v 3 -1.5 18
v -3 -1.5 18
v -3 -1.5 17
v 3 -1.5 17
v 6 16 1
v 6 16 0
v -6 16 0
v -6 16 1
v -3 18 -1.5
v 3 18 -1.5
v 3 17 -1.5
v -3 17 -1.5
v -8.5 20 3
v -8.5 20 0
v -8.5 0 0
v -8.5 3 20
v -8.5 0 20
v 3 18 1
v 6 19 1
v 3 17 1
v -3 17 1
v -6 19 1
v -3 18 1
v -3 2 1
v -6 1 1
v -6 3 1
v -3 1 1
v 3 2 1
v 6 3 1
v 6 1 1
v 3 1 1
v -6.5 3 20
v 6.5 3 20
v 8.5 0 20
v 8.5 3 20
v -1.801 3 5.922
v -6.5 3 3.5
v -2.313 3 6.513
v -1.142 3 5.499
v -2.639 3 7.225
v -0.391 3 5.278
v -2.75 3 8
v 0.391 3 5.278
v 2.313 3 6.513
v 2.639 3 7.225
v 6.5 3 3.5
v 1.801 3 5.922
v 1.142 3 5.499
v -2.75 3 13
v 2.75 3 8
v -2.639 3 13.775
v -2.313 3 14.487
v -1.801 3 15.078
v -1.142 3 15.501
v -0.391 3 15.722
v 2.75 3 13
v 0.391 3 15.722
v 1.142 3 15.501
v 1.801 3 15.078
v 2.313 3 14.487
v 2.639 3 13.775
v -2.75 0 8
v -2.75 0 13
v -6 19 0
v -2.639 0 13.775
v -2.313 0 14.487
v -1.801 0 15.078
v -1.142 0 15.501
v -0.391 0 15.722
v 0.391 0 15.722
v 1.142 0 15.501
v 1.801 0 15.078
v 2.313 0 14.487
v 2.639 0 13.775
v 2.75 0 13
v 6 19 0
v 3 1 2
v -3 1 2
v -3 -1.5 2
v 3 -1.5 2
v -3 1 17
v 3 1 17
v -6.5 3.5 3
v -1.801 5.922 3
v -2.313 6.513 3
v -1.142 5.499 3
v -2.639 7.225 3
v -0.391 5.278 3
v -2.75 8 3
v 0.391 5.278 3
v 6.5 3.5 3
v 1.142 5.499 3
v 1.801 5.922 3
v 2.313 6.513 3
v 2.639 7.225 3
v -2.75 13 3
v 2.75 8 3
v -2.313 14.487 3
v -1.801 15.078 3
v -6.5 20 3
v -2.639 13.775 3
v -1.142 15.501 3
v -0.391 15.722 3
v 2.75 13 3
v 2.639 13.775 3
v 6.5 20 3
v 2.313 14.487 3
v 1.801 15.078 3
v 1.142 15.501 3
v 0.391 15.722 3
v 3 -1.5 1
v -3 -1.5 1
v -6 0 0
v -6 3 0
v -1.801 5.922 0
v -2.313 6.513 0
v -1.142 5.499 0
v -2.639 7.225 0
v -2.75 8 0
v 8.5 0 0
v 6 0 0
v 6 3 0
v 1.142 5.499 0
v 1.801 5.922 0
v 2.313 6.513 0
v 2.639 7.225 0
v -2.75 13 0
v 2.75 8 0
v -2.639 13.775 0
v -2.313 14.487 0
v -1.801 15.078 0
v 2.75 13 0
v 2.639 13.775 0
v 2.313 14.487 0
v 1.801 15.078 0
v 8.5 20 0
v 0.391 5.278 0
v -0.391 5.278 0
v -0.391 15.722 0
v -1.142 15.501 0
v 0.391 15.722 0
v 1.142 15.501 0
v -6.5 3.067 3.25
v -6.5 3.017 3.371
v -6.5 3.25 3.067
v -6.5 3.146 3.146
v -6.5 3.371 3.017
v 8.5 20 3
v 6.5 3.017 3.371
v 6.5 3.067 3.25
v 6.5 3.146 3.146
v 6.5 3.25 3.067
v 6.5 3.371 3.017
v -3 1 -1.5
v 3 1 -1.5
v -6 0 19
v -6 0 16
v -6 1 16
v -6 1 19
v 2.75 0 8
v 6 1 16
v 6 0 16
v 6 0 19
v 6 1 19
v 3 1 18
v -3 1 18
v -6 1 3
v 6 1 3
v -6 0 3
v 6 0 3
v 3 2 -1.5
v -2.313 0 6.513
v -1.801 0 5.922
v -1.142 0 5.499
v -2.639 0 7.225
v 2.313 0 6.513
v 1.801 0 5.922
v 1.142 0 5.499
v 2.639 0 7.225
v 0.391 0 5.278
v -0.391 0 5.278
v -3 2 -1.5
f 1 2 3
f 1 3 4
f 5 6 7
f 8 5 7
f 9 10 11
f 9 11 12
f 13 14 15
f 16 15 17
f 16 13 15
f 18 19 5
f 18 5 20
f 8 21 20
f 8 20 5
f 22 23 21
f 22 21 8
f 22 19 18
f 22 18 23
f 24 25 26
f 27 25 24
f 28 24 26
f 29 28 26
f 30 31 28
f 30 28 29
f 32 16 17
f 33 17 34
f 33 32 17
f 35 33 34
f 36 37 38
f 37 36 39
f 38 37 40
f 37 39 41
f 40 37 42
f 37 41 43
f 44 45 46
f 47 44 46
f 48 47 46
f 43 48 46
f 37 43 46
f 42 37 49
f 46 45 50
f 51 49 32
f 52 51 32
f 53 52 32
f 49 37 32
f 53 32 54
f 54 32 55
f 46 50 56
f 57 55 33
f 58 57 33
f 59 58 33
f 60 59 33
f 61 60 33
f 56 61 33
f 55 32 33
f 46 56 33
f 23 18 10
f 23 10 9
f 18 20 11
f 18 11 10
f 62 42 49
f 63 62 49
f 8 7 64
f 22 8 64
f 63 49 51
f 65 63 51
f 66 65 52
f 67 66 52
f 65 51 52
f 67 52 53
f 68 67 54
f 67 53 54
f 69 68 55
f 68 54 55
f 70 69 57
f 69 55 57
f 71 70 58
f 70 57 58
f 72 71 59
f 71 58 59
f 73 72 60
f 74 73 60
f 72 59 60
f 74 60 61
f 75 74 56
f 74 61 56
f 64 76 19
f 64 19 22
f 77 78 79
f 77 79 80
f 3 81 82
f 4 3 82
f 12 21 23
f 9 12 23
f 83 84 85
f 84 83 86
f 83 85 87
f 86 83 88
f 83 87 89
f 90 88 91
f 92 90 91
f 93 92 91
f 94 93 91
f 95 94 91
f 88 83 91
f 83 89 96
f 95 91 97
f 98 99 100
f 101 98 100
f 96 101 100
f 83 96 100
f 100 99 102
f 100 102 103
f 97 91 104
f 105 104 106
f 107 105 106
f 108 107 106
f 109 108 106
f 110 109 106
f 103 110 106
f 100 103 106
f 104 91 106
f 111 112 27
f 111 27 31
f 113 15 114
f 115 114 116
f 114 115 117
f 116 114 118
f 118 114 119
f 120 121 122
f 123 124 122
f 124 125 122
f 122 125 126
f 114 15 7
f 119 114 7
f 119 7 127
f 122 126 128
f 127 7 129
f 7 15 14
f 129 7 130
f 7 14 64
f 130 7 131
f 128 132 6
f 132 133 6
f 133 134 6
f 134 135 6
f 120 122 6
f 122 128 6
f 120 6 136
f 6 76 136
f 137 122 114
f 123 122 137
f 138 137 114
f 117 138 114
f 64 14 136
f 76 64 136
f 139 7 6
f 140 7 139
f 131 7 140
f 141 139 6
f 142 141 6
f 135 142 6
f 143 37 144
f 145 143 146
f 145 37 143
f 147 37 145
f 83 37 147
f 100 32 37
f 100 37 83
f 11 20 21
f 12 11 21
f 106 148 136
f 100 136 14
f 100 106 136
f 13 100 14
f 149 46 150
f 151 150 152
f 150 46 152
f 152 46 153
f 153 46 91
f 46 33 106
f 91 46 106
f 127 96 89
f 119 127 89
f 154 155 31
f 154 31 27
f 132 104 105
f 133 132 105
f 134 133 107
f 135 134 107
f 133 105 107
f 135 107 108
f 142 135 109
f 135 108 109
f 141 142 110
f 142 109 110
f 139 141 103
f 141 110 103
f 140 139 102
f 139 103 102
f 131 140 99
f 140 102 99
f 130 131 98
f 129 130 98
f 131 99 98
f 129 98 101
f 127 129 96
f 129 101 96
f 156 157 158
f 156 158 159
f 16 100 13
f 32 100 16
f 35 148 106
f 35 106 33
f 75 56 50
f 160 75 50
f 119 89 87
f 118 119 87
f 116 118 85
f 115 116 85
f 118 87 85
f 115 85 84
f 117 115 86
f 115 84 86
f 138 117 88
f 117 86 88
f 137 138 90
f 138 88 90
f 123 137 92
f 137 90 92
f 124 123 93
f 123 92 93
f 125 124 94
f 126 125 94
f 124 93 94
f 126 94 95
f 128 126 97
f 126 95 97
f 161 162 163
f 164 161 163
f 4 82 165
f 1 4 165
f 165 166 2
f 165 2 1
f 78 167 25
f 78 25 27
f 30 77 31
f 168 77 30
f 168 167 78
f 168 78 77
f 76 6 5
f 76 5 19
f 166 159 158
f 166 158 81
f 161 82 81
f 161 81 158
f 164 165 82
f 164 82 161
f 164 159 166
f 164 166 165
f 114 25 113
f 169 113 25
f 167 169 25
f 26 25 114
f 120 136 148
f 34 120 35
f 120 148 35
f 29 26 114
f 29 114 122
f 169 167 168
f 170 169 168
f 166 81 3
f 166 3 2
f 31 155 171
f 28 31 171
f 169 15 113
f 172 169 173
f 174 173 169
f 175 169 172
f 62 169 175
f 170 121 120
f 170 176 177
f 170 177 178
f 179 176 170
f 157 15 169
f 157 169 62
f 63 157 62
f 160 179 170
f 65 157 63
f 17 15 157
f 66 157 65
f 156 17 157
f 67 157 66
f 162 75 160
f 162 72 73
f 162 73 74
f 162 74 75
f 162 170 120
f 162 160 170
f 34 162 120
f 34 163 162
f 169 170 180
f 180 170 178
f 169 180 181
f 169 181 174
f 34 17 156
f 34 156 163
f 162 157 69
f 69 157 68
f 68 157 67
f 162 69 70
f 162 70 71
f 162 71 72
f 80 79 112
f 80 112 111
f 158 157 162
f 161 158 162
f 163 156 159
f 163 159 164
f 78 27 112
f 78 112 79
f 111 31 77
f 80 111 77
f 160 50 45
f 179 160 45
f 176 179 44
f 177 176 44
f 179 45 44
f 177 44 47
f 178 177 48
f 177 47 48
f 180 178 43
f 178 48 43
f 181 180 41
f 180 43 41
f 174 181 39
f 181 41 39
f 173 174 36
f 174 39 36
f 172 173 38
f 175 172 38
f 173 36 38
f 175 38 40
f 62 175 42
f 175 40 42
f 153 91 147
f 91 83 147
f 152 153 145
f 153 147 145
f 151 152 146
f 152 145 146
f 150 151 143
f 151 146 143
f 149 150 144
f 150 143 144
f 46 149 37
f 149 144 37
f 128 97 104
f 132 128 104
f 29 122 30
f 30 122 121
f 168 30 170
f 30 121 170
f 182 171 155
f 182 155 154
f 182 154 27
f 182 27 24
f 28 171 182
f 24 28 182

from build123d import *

# Parameters (mm, degrees)
BOSS_EXTRUDE1_DEPTH = 17
SKETCH17_W          = 17
SKETCH17_H          = 17
BOSS_EXTRUDE2_DEPTH = 3
CUT_EXTRUDE1_DEPTH  = 13
SKETCH23_W          = 17
SKETCH23_H          = 20
BOSS_EXTRUDE3_DEPTH = 3
SKETCH24_W          = 12
SKETCH24_H          = 1
CUT_EXTRUDE2_DEPTH  = 3
CUT_EXTRUDE3_REACH  = 29.591
SKETCH30_W          = 12
SKETCH30_H          = 1
CUT_EXTRUDE4_DEPTH  = 28.590759323
CUT_EXTRUDE5_DEPTH  = 28.590759323
SKETCH39_W          = 12
SKETCH39_H          = 3
CUT_EXTRUDE6_DEPTH  = 1
SKETCH40_W          = 6
SKETCH40_H          = 1
BOSS_EXTRUDE4_DEPTH = 2.5
SKETCH41_W          = 6
SKETCH41_H          = 1
BOSS_EXTRUDE5_DEPTH = 2.5
BOSS_EXTRUDE6_REACH = 32.57
SKETCH49_W          = 6
SKETCH49_H          = 1
SKETCH50_W          = 12
SKETCH50_H          = 3
CUT_EXTRUDE7_DEPTH  = 1
SKETCH51_W          = 6
SKETCH51_H          = 1
BOSS_EXTRUDE7_DEPTH = 2.5
FILLET1_R           = 0.5


with BuildPart() as part:
    # Sketch16 → Boss-Extrude1 (new body)
    with BuildSketch(Plane(origin=(8.5, 0, 0), x_dir=(0, 0, -1), z_dir=(1, 0, 0))):
        Polygon((-3, 3), (-3, 20), (-20, 3), align=None)
    extrude(amount=-BOSS_EXTRUDE1_DEPTH)

    # Sketch17 → Boss-Extrude2 (add)
    with BuildSketch(Plane(origin=(0, 0, 3), x_dir=(-1, 0, 0), z_dir=(0, 0, -1))):
        with Locations((0, 11.5)):
            Rectangle(SKETCH17_W, SKETCH17_H)
    extrude(amount=BOSS_EXTRUDE2_DEPTH)

    # Sketch22 → Cut-Extrude1 (cut)
    with BuildSketch(Plane(origin=(6.5, 0, 0), x_dir=(0, 0, -1), z_dir=(1, 0, 0))):
        Polygon((-3, 20), (-20, 3), (-3, 3), align=None)
    extrude(amount=-CUT_EXTRUDE1_DEPTH, mode=Mode.SUBTRACT)

    # Sketch23 → Boss-Extrude3 (add)
    with BuildSketch(Plane.XZ.offset(-3)):
        with Locations((0, 10)):
            Rectangle(SKETCH23_W, SKETCH23_H)
    extrude(amount=BOSS_EXTRUDE3_DEPTH)

    # Sketch24 → Cut-Extrude2 (cut)
    with BuildSketch(Plane.XZ):
        with Locations((0, 0.5)):
            Rectangle(SKETCH24_W, SKETCH24_H)
    extrude(amount=-CUT_EXTRUDE2_DEPTH, mode=Mode.SUBTRACT)

    # Sketch30 → Cut-Extrude3 (cut, up to next)
    with BuildSketch(Plane.XY.offset(3), mode=Mode.PRIVATE) as cut_extrude3_sk1:
        with Locations((0, 0.5)):
            Rectangle(SKETCH30_W, SKETCH30_H)
    cut_extrude3_tool1 = extrude(cut_extrude3_sk1.sketch, amount=-CUT_EXTRUDE3_REACH, mode=Mode.PRIVATE) & part.part
    add(cut_extrude3_tool1.solids().sort_by_distance((0, 0.5, 3))[0], mode=Mode.SUBTRACT)

    # Sketch37 → Cut-Extrude4 (cut, through all)
    with BuildSketch(Plane.XY.offset(3)):
        with BuildLine():
            Line((2.75, 8), (2.75, 13))
            ThreePointArc((2.75, 13), (0, 15.75), (-2.75, 13))
            Line((-2.75, 13), (-2.75, 8))
            ThreePointArc((-2.75, 8), (0, 5.25), (2.75, 8))
        make_face()
    extrude(amount=-CUT_EXTRUDE4_DEPTH, mode=Mode.SUBTRACT)

    # Sketch38 → Cut-Extrude5 (cut, through all)
    with BuildSketch(Plane(origin=(0, 3, 0), x_dir=(-1, 0, 0), z_dir=(0, 1, 0))):
        with BuildLine():
            Line((-2.75, 13), (-2.75, 8))
            ThreePointArc((-2.75, 8), (0, 5.25), (2.75, 8))
            Line((2.75, 8), (2.75, 13))
            ThreePointArc((2.75, 13), (0, 15.75), (-2.75, 13))
        make_face()
    extrude(amount=-CUT_EXTRUDE5_DEPTH, mode=Mode.SUBTRACT)

    # Sketch39 → Cut-Extrude6 (cut)
    with BuildSketch(Plane.XZ):
        with Locations((0, 17.5)):
            Rectangle(SKETCH39_W, SKETCH39_H)
    extrude(amount=-CUT_EXTRUDE6_DEPTH, mode=Mode.SUBTRACT)

    # Sketch40 → Boss-Extrude4 (add)
    with BuildSketch(Plane.XZ.offset(-1)):
        with Locations((0, 17.5)):
            Rectangle(SKETCH40_W, SKETCH40_H)
    extrude(amount=BOSS_EXTRUDE4_DEPTH)

    # Sketch41 → Boss-Extrude5 (add)
    with BuildSketch(Plane.XZ.offset(-1)):
        with Locations((0, 1.5)):
            Rectangle(SKETCH41_W, SKETCH41_H)
    extrude(amount=BOSS_EXTRUDE5_DEPTH)

    # Sketch49 → Boss-Extrude6 (add, up to next)
    with BuildSketch(Plane(origin=(0, 0, -1.5), x_dir=(-1, 0, 0), z_dir=(0, 0, -1)), mode=Mode.PRIVATE) as boss_extrude6_sk1:
        with Locations((0, 1.5)):
            Rectangle(SKETCH49_W, SKETCH49_H)
    boss_extrude6_tool1 = extrude(boss_extrude6_sk1.sketch, amount=-BOSS_EXTRUDE6_REACH, mode=Mode.PRIVATE) - part.part
    add(boss_extrude6_tool1.solids().sort_by_distance((0, 1.5, -1.5))[0])

    # Sketch50 → Cut-Extrude7 (cut)
    with BuildSketch(Plane(origin=(0, 0, 0), x_dir=(-1, 0, 0), z_dir=(0, 0, -1))):
        with Locations((0, 17.5)):
            Rectangle(SKETCH50_W, SKETCH50_H)
    extrude(amount=-CUT_EXTRUDE7_DEPTH, mode=Mode.SUBTRACT)

    # Sketch51 → Boss-Extrude7 (add)
    with BuildSketch(Plane(origin=(0, 0, 1), x_dir=(-1, 0, 0), z_dir=(0, 0, -1))):
        with Locations((0, 17.5)):
            Rectangle(SKETCH51_W, SKETCH51_H)
    extrude(amount=BOSS_EXTRUDE7_DEPTH)

    # Fillet1
    fillet1_edges = [part.edges().sort_by_distance(p)[0] for p in [
        (0, 3, 3),
    ]]
    fillet(fillet1_edges, radius=FILLET1_R)


solid = part.part
